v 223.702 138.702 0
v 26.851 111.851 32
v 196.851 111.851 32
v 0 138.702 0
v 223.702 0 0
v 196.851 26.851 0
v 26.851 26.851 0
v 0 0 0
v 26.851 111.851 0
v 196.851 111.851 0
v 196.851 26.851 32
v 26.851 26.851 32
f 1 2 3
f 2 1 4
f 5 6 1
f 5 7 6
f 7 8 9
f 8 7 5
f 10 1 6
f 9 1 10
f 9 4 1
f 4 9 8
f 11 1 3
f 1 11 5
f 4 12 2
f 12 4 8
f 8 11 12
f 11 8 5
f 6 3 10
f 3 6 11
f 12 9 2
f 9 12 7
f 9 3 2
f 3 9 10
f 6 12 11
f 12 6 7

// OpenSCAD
/* This file contains a base and a shell that, when put together,
   can be used to streamline the process of making angled kitchen tiles
   from clay (i.e. you are supposed to shape the tile with a bit more
   height than the shell, and then run a knife along the shell edges to
   get uniform angle). (Un)comment shell/base after need.
*/

/** PARAMS **/
hb = 28.8; // height of base in mm (i.e. offset from table)
h = 3.2;   // height of tile (bottom to angle)
a = 40;    // angle of tile
l = 170;   // length of tile
w = 85;    // width of tile

/** AUTO-TUNED PARAMS **/
hs = hb + h;      // height of shell
ws = tan(a) * hs; // width of shell

/** SHELL **/
difference(){
 hull(){
  polyhedron(
   points=[[0,0,0],[l+(2*ws),0,0],[l+(2*ws),w+(2*ws),0],[0,w+(2*ws),0],
           [ws,ws,hs],[l+ws,ws,hs],[l+ws,w+ws,hs],[ws,w+ws,hs]],
   faces =[[0,1,2,3],[0,1,5,4],[1,2,6,5],[2,3,7,6],[3,0,4,7],[4,5,6,7]]);
 }
 translate([ws,ws,-1]){cube([l,w,hs+3]);}
}

/** BASE **/
// cube([l-1, w-1, hb]);
